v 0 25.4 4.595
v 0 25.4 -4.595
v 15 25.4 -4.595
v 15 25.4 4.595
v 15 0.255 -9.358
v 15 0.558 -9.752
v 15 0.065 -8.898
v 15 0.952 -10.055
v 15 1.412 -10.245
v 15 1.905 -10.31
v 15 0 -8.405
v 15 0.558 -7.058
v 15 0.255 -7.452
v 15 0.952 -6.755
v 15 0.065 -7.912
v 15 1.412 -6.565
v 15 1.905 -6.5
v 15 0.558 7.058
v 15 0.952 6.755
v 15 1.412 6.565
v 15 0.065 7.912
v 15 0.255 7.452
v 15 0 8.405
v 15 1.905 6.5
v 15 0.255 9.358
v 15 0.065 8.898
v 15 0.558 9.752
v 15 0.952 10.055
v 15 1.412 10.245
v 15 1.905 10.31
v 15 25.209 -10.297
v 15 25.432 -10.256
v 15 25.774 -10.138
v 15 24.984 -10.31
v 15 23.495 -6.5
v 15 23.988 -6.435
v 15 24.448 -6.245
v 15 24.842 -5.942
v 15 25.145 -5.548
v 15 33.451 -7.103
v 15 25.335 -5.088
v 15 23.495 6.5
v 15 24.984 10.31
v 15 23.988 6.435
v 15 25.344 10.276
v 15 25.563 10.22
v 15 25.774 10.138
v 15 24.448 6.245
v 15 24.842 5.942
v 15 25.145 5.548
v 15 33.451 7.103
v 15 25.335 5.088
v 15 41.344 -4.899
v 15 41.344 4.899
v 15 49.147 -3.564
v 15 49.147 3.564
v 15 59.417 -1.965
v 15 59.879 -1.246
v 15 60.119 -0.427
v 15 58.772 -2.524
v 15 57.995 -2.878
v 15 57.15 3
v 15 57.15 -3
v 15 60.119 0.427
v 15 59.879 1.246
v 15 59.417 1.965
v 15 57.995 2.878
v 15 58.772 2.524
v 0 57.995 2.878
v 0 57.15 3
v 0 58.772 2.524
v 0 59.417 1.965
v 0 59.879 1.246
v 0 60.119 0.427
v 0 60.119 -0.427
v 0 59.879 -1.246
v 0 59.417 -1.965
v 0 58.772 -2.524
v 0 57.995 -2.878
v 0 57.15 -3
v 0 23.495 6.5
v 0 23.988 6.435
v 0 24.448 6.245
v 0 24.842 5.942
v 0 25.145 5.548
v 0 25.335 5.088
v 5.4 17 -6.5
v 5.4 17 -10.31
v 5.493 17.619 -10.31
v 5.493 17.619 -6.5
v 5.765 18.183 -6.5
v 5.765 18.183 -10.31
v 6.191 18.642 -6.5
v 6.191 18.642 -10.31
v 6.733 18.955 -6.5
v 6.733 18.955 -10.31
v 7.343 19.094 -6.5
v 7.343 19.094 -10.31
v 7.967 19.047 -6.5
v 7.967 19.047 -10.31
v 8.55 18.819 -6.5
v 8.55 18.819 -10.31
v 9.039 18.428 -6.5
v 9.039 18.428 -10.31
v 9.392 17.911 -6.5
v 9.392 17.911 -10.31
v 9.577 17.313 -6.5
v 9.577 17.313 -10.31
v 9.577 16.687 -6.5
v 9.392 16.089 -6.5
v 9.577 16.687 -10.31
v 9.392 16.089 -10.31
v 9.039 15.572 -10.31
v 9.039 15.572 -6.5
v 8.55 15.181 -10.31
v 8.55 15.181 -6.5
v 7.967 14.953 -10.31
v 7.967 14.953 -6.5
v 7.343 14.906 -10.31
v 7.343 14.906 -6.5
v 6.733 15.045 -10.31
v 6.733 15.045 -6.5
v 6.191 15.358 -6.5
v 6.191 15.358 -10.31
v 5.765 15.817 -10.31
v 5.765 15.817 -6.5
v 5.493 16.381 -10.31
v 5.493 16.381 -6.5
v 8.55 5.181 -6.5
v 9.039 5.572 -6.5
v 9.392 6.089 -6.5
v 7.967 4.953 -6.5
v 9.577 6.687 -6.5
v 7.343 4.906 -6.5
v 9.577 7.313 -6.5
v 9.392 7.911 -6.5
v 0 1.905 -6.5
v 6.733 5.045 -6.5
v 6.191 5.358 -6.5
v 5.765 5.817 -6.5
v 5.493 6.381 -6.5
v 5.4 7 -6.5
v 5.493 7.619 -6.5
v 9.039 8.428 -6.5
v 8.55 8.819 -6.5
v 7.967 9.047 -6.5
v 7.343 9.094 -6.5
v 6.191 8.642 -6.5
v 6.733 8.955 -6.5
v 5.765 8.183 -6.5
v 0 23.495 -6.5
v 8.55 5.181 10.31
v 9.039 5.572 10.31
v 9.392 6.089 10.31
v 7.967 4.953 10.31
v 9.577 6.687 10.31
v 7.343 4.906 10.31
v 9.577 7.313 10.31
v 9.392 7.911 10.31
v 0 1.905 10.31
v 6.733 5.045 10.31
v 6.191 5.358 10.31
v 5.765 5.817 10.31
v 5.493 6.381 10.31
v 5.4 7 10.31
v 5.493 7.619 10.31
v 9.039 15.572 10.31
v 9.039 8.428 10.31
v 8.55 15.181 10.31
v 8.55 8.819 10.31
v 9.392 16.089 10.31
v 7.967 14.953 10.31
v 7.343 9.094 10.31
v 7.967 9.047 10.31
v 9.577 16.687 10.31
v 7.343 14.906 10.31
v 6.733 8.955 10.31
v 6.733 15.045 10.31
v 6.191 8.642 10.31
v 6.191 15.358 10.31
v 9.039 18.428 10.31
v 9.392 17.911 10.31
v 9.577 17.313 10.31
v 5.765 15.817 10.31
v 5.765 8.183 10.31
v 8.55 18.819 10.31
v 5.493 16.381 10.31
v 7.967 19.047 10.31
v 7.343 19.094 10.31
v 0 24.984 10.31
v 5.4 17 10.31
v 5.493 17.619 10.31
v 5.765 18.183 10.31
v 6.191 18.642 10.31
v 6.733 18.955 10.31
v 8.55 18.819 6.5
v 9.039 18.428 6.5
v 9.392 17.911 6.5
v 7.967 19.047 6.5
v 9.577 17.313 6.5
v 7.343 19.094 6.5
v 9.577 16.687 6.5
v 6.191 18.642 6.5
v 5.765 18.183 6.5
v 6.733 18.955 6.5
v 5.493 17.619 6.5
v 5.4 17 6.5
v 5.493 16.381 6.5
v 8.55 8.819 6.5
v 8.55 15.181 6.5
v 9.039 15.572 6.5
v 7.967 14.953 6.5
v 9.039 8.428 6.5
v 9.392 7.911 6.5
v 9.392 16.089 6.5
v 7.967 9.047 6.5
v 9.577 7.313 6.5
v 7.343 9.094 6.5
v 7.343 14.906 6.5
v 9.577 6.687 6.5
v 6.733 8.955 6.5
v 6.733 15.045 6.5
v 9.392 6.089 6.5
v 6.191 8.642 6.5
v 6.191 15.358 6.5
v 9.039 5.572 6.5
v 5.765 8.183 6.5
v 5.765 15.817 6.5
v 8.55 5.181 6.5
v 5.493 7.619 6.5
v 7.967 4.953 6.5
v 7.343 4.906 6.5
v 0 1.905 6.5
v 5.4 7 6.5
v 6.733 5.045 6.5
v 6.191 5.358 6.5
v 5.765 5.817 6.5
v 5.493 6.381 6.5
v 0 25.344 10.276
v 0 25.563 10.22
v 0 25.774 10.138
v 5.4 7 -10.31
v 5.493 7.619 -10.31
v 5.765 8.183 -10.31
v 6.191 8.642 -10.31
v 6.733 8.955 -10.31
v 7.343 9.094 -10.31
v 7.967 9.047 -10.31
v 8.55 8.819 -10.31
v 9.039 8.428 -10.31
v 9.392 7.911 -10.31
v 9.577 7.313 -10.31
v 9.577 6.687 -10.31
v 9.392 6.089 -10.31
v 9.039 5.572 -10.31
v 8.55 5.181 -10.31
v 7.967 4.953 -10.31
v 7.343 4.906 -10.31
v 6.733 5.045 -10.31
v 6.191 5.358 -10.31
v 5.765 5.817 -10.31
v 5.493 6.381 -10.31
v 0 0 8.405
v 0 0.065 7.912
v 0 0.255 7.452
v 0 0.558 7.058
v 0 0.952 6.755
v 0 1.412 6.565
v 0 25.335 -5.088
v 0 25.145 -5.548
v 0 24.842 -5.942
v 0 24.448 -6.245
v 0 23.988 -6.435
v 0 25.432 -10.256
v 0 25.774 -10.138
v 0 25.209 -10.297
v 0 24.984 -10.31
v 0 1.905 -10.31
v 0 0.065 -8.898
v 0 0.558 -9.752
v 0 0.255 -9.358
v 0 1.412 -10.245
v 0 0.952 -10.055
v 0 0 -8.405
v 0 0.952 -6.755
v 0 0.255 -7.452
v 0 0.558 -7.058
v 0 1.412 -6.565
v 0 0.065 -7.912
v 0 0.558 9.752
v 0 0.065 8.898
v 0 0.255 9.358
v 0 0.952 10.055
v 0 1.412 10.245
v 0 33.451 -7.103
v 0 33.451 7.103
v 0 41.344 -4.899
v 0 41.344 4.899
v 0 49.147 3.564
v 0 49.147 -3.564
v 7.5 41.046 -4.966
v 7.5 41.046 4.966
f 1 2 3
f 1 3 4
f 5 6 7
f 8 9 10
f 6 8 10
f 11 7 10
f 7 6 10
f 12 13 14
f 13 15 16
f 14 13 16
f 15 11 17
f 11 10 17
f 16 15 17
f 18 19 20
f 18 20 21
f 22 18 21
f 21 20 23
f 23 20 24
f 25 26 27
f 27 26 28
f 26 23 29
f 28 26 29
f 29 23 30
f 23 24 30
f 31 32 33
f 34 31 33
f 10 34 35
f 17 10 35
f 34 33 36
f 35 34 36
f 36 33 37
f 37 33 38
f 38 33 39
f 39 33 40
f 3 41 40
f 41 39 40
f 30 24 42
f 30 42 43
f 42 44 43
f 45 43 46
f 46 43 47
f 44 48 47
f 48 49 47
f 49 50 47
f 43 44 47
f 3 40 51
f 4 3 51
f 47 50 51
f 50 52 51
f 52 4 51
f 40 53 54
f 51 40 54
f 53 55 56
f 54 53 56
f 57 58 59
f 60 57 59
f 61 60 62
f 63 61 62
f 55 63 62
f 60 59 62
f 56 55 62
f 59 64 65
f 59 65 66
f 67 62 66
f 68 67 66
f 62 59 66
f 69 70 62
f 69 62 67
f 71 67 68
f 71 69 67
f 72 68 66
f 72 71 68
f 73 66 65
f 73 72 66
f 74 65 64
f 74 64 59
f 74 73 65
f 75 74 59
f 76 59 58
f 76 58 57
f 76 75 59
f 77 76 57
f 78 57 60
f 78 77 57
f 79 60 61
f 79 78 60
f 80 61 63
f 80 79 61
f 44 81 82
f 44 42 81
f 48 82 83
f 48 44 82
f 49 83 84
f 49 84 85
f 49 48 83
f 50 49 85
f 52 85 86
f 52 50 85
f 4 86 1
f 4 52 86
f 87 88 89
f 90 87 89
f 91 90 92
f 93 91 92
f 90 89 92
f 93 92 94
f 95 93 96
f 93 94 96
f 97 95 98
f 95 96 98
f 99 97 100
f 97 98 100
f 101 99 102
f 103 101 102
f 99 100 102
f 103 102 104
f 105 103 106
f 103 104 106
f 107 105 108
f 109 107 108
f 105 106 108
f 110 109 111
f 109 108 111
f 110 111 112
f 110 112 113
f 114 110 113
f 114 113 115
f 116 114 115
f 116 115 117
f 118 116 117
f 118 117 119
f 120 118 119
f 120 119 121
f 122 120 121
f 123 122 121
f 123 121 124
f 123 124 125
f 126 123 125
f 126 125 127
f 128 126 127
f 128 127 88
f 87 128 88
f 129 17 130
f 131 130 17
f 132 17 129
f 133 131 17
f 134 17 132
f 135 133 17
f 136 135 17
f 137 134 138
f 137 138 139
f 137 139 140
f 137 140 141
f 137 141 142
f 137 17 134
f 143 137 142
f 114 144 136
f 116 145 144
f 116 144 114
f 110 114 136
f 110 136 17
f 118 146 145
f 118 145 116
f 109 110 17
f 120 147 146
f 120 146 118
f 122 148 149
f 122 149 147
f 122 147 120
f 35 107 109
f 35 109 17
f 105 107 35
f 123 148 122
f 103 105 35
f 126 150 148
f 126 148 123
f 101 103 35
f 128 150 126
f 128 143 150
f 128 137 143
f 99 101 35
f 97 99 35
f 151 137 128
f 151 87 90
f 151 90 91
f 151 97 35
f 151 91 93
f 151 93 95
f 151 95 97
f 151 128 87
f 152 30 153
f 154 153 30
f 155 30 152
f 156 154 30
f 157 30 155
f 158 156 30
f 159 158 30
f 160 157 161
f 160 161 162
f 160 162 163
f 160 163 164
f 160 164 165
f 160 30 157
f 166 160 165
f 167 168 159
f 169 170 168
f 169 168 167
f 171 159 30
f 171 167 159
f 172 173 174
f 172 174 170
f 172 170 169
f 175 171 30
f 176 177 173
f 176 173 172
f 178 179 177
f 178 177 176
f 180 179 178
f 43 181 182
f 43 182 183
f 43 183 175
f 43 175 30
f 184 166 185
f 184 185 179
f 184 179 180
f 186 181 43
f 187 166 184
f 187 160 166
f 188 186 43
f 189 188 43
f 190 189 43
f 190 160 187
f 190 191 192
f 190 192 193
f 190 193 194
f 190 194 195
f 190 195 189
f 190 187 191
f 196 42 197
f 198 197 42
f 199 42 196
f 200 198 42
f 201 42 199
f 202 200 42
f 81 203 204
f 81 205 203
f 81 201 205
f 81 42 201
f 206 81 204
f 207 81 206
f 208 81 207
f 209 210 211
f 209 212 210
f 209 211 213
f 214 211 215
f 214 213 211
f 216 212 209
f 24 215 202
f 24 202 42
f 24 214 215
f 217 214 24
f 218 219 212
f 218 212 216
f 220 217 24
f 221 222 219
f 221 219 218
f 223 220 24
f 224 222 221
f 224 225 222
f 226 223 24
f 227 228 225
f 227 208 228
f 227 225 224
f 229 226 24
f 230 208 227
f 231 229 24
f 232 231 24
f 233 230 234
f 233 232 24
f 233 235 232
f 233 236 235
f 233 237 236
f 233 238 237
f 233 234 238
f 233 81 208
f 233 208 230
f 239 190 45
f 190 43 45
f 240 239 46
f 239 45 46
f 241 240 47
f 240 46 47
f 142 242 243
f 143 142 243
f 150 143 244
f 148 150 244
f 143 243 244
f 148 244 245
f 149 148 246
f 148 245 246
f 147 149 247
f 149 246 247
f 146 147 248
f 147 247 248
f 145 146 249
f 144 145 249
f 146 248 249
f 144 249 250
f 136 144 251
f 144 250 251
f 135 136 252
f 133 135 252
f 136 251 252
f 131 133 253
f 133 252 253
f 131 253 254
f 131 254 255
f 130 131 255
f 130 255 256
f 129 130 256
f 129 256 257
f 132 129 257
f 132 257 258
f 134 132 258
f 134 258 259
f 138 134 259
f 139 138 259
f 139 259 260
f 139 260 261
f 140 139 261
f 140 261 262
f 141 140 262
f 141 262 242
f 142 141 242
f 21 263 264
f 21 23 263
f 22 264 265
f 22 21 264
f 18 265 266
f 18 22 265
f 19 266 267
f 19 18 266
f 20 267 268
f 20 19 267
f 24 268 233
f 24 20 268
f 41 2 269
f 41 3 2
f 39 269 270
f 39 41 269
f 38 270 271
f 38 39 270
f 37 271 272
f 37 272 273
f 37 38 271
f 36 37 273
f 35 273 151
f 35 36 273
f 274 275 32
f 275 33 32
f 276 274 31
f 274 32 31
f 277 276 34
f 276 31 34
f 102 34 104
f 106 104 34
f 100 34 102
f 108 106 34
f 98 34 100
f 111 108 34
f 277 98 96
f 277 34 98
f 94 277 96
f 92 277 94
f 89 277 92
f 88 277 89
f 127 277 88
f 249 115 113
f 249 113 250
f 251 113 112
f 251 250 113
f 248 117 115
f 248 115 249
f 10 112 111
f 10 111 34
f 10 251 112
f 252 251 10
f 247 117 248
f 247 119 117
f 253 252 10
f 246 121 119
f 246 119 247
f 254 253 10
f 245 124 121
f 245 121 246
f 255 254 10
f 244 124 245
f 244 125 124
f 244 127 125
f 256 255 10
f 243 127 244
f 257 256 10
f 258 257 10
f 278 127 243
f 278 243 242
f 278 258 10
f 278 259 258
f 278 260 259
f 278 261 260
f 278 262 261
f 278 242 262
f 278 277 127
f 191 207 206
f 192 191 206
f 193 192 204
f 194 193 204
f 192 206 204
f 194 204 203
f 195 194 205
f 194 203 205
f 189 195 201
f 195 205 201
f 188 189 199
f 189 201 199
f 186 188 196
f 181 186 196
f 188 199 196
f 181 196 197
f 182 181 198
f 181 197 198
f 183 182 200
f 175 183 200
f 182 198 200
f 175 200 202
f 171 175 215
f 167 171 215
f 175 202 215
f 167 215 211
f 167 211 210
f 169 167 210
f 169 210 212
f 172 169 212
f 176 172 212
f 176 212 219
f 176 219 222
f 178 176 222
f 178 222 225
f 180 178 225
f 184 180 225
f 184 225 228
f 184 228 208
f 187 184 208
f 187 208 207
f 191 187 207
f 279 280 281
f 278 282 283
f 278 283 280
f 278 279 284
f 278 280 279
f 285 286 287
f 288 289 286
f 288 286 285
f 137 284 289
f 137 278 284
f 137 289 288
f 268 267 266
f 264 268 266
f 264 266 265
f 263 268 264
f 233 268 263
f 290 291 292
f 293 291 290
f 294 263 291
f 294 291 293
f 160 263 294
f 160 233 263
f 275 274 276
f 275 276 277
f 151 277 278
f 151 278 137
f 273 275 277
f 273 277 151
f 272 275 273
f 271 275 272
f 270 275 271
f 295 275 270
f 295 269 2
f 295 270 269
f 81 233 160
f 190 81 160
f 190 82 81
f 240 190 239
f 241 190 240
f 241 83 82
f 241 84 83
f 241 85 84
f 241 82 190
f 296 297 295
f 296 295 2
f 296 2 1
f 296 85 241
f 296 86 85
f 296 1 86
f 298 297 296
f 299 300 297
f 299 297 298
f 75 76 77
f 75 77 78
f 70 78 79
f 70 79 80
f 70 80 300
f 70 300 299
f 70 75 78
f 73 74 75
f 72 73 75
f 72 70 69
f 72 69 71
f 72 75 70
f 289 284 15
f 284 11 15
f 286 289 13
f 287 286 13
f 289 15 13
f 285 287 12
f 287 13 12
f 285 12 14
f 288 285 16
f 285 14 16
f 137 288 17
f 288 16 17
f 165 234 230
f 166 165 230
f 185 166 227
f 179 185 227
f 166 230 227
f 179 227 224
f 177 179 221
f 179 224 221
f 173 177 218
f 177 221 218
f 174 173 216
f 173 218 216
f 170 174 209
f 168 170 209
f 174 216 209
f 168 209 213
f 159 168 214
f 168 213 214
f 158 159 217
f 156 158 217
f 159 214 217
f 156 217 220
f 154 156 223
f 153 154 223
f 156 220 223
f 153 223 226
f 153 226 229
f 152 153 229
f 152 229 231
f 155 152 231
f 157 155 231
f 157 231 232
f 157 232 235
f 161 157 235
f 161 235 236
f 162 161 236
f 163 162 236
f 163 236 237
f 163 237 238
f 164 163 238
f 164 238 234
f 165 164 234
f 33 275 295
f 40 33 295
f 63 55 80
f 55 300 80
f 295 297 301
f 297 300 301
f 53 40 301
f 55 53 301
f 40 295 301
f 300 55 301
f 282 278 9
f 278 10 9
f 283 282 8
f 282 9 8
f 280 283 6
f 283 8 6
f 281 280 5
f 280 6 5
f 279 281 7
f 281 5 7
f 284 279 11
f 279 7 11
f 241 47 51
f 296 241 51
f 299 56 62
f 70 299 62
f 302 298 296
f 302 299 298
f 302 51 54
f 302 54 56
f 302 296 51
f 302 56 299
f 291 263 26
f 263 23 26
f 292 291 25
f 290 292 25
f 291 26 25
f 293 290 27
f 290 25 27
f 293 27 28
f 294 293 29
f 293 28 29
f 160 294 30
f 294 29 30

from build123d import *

# Parameters (mm, degrees)
BOSS_EXTRUDE1_DEPTH = 15
SKETCH2_R           = 2.1
CUT_EXTRUDE1_DEPTH  = 66.331515512
FILLET2_R           = 1.905


with BuildPart() as part:
    # Sketch1 → Boss-Extrude1 (new body)
    with BuildSketch(Plane(origin=(0, 0, 0), x_dir=(0, 0, -1), z_dir=(1, 0, 0))):
        with BuildLine():
            Line((-6.5, 0), (-10.31, 0))
            Line((-10.31, 0), (-10.31, 25.4))
            add(Edge.make_bspline(
                [(-10.31, 25.4), (-3.368064257, 40.422360056), (-3, 57.15)],
                knots=[0, 0, 0, 1, 1, 1], degree=2))
            ThreePointArc((-3, 57.15), (0, 60.15), (3, 57.15))
            add(Edge.make_bspline(
                [(10.31, 25.4), (3.368064257, 40.422360056), (3, 57.15)],
                knots=[0, 0, 0, 1, 1, 1], degree=2))
            Line((10.31, 25.4), (10.31, 0))
            Line((10.31, 0), (6.5, 0))
            Line((6.5, 0), (6.5, 25.4))
            Line((6.5, 25.4), (-6.5, 25.4))
            Line((-6.5, 25.4), (-6.5, 0))
        make_face()
    extrude(amount=BOSS_EXTRUDE1_DEPTH)

    # Sketch2 → Cut-Extrude1 (cut, through all)
    with BuildSketch(Plane(origin=(0, 0, -10.31), x_dir=(-1, 0, 0), z_dir=(0, 0, -1))):
        with Locations((-7.5, 7)):
            Circle(SKETCH2_R)
        with Locations((-7.5, 17)):
            Circle(SKETCH2_R)
    extrude(amount=-CUT_EXTRUDE1_DEPTH, mode=Mode.SUBTRACT)

    # Fillet2
    fillet2_edges = [part.edges().sort_by_distance(p)[0] for p in [
        (7.5, 25.4, -10.31),
        (7.5, 0, -10.31),
        (7.5, 0, -6.5),
        (7.5, 0, 6.5),
        (7.5, 0, 10.31),
        (7.5, 25.4, -6.5),
        (7.5, 25.4, 6.5),
        (7.5, 25.4, 10.31),
    ]]
    fillet(fillet2_edges, radius=FILLET2_R - 0.0001)  # a hair under: the kernel refuses the full size


solid = part.part
